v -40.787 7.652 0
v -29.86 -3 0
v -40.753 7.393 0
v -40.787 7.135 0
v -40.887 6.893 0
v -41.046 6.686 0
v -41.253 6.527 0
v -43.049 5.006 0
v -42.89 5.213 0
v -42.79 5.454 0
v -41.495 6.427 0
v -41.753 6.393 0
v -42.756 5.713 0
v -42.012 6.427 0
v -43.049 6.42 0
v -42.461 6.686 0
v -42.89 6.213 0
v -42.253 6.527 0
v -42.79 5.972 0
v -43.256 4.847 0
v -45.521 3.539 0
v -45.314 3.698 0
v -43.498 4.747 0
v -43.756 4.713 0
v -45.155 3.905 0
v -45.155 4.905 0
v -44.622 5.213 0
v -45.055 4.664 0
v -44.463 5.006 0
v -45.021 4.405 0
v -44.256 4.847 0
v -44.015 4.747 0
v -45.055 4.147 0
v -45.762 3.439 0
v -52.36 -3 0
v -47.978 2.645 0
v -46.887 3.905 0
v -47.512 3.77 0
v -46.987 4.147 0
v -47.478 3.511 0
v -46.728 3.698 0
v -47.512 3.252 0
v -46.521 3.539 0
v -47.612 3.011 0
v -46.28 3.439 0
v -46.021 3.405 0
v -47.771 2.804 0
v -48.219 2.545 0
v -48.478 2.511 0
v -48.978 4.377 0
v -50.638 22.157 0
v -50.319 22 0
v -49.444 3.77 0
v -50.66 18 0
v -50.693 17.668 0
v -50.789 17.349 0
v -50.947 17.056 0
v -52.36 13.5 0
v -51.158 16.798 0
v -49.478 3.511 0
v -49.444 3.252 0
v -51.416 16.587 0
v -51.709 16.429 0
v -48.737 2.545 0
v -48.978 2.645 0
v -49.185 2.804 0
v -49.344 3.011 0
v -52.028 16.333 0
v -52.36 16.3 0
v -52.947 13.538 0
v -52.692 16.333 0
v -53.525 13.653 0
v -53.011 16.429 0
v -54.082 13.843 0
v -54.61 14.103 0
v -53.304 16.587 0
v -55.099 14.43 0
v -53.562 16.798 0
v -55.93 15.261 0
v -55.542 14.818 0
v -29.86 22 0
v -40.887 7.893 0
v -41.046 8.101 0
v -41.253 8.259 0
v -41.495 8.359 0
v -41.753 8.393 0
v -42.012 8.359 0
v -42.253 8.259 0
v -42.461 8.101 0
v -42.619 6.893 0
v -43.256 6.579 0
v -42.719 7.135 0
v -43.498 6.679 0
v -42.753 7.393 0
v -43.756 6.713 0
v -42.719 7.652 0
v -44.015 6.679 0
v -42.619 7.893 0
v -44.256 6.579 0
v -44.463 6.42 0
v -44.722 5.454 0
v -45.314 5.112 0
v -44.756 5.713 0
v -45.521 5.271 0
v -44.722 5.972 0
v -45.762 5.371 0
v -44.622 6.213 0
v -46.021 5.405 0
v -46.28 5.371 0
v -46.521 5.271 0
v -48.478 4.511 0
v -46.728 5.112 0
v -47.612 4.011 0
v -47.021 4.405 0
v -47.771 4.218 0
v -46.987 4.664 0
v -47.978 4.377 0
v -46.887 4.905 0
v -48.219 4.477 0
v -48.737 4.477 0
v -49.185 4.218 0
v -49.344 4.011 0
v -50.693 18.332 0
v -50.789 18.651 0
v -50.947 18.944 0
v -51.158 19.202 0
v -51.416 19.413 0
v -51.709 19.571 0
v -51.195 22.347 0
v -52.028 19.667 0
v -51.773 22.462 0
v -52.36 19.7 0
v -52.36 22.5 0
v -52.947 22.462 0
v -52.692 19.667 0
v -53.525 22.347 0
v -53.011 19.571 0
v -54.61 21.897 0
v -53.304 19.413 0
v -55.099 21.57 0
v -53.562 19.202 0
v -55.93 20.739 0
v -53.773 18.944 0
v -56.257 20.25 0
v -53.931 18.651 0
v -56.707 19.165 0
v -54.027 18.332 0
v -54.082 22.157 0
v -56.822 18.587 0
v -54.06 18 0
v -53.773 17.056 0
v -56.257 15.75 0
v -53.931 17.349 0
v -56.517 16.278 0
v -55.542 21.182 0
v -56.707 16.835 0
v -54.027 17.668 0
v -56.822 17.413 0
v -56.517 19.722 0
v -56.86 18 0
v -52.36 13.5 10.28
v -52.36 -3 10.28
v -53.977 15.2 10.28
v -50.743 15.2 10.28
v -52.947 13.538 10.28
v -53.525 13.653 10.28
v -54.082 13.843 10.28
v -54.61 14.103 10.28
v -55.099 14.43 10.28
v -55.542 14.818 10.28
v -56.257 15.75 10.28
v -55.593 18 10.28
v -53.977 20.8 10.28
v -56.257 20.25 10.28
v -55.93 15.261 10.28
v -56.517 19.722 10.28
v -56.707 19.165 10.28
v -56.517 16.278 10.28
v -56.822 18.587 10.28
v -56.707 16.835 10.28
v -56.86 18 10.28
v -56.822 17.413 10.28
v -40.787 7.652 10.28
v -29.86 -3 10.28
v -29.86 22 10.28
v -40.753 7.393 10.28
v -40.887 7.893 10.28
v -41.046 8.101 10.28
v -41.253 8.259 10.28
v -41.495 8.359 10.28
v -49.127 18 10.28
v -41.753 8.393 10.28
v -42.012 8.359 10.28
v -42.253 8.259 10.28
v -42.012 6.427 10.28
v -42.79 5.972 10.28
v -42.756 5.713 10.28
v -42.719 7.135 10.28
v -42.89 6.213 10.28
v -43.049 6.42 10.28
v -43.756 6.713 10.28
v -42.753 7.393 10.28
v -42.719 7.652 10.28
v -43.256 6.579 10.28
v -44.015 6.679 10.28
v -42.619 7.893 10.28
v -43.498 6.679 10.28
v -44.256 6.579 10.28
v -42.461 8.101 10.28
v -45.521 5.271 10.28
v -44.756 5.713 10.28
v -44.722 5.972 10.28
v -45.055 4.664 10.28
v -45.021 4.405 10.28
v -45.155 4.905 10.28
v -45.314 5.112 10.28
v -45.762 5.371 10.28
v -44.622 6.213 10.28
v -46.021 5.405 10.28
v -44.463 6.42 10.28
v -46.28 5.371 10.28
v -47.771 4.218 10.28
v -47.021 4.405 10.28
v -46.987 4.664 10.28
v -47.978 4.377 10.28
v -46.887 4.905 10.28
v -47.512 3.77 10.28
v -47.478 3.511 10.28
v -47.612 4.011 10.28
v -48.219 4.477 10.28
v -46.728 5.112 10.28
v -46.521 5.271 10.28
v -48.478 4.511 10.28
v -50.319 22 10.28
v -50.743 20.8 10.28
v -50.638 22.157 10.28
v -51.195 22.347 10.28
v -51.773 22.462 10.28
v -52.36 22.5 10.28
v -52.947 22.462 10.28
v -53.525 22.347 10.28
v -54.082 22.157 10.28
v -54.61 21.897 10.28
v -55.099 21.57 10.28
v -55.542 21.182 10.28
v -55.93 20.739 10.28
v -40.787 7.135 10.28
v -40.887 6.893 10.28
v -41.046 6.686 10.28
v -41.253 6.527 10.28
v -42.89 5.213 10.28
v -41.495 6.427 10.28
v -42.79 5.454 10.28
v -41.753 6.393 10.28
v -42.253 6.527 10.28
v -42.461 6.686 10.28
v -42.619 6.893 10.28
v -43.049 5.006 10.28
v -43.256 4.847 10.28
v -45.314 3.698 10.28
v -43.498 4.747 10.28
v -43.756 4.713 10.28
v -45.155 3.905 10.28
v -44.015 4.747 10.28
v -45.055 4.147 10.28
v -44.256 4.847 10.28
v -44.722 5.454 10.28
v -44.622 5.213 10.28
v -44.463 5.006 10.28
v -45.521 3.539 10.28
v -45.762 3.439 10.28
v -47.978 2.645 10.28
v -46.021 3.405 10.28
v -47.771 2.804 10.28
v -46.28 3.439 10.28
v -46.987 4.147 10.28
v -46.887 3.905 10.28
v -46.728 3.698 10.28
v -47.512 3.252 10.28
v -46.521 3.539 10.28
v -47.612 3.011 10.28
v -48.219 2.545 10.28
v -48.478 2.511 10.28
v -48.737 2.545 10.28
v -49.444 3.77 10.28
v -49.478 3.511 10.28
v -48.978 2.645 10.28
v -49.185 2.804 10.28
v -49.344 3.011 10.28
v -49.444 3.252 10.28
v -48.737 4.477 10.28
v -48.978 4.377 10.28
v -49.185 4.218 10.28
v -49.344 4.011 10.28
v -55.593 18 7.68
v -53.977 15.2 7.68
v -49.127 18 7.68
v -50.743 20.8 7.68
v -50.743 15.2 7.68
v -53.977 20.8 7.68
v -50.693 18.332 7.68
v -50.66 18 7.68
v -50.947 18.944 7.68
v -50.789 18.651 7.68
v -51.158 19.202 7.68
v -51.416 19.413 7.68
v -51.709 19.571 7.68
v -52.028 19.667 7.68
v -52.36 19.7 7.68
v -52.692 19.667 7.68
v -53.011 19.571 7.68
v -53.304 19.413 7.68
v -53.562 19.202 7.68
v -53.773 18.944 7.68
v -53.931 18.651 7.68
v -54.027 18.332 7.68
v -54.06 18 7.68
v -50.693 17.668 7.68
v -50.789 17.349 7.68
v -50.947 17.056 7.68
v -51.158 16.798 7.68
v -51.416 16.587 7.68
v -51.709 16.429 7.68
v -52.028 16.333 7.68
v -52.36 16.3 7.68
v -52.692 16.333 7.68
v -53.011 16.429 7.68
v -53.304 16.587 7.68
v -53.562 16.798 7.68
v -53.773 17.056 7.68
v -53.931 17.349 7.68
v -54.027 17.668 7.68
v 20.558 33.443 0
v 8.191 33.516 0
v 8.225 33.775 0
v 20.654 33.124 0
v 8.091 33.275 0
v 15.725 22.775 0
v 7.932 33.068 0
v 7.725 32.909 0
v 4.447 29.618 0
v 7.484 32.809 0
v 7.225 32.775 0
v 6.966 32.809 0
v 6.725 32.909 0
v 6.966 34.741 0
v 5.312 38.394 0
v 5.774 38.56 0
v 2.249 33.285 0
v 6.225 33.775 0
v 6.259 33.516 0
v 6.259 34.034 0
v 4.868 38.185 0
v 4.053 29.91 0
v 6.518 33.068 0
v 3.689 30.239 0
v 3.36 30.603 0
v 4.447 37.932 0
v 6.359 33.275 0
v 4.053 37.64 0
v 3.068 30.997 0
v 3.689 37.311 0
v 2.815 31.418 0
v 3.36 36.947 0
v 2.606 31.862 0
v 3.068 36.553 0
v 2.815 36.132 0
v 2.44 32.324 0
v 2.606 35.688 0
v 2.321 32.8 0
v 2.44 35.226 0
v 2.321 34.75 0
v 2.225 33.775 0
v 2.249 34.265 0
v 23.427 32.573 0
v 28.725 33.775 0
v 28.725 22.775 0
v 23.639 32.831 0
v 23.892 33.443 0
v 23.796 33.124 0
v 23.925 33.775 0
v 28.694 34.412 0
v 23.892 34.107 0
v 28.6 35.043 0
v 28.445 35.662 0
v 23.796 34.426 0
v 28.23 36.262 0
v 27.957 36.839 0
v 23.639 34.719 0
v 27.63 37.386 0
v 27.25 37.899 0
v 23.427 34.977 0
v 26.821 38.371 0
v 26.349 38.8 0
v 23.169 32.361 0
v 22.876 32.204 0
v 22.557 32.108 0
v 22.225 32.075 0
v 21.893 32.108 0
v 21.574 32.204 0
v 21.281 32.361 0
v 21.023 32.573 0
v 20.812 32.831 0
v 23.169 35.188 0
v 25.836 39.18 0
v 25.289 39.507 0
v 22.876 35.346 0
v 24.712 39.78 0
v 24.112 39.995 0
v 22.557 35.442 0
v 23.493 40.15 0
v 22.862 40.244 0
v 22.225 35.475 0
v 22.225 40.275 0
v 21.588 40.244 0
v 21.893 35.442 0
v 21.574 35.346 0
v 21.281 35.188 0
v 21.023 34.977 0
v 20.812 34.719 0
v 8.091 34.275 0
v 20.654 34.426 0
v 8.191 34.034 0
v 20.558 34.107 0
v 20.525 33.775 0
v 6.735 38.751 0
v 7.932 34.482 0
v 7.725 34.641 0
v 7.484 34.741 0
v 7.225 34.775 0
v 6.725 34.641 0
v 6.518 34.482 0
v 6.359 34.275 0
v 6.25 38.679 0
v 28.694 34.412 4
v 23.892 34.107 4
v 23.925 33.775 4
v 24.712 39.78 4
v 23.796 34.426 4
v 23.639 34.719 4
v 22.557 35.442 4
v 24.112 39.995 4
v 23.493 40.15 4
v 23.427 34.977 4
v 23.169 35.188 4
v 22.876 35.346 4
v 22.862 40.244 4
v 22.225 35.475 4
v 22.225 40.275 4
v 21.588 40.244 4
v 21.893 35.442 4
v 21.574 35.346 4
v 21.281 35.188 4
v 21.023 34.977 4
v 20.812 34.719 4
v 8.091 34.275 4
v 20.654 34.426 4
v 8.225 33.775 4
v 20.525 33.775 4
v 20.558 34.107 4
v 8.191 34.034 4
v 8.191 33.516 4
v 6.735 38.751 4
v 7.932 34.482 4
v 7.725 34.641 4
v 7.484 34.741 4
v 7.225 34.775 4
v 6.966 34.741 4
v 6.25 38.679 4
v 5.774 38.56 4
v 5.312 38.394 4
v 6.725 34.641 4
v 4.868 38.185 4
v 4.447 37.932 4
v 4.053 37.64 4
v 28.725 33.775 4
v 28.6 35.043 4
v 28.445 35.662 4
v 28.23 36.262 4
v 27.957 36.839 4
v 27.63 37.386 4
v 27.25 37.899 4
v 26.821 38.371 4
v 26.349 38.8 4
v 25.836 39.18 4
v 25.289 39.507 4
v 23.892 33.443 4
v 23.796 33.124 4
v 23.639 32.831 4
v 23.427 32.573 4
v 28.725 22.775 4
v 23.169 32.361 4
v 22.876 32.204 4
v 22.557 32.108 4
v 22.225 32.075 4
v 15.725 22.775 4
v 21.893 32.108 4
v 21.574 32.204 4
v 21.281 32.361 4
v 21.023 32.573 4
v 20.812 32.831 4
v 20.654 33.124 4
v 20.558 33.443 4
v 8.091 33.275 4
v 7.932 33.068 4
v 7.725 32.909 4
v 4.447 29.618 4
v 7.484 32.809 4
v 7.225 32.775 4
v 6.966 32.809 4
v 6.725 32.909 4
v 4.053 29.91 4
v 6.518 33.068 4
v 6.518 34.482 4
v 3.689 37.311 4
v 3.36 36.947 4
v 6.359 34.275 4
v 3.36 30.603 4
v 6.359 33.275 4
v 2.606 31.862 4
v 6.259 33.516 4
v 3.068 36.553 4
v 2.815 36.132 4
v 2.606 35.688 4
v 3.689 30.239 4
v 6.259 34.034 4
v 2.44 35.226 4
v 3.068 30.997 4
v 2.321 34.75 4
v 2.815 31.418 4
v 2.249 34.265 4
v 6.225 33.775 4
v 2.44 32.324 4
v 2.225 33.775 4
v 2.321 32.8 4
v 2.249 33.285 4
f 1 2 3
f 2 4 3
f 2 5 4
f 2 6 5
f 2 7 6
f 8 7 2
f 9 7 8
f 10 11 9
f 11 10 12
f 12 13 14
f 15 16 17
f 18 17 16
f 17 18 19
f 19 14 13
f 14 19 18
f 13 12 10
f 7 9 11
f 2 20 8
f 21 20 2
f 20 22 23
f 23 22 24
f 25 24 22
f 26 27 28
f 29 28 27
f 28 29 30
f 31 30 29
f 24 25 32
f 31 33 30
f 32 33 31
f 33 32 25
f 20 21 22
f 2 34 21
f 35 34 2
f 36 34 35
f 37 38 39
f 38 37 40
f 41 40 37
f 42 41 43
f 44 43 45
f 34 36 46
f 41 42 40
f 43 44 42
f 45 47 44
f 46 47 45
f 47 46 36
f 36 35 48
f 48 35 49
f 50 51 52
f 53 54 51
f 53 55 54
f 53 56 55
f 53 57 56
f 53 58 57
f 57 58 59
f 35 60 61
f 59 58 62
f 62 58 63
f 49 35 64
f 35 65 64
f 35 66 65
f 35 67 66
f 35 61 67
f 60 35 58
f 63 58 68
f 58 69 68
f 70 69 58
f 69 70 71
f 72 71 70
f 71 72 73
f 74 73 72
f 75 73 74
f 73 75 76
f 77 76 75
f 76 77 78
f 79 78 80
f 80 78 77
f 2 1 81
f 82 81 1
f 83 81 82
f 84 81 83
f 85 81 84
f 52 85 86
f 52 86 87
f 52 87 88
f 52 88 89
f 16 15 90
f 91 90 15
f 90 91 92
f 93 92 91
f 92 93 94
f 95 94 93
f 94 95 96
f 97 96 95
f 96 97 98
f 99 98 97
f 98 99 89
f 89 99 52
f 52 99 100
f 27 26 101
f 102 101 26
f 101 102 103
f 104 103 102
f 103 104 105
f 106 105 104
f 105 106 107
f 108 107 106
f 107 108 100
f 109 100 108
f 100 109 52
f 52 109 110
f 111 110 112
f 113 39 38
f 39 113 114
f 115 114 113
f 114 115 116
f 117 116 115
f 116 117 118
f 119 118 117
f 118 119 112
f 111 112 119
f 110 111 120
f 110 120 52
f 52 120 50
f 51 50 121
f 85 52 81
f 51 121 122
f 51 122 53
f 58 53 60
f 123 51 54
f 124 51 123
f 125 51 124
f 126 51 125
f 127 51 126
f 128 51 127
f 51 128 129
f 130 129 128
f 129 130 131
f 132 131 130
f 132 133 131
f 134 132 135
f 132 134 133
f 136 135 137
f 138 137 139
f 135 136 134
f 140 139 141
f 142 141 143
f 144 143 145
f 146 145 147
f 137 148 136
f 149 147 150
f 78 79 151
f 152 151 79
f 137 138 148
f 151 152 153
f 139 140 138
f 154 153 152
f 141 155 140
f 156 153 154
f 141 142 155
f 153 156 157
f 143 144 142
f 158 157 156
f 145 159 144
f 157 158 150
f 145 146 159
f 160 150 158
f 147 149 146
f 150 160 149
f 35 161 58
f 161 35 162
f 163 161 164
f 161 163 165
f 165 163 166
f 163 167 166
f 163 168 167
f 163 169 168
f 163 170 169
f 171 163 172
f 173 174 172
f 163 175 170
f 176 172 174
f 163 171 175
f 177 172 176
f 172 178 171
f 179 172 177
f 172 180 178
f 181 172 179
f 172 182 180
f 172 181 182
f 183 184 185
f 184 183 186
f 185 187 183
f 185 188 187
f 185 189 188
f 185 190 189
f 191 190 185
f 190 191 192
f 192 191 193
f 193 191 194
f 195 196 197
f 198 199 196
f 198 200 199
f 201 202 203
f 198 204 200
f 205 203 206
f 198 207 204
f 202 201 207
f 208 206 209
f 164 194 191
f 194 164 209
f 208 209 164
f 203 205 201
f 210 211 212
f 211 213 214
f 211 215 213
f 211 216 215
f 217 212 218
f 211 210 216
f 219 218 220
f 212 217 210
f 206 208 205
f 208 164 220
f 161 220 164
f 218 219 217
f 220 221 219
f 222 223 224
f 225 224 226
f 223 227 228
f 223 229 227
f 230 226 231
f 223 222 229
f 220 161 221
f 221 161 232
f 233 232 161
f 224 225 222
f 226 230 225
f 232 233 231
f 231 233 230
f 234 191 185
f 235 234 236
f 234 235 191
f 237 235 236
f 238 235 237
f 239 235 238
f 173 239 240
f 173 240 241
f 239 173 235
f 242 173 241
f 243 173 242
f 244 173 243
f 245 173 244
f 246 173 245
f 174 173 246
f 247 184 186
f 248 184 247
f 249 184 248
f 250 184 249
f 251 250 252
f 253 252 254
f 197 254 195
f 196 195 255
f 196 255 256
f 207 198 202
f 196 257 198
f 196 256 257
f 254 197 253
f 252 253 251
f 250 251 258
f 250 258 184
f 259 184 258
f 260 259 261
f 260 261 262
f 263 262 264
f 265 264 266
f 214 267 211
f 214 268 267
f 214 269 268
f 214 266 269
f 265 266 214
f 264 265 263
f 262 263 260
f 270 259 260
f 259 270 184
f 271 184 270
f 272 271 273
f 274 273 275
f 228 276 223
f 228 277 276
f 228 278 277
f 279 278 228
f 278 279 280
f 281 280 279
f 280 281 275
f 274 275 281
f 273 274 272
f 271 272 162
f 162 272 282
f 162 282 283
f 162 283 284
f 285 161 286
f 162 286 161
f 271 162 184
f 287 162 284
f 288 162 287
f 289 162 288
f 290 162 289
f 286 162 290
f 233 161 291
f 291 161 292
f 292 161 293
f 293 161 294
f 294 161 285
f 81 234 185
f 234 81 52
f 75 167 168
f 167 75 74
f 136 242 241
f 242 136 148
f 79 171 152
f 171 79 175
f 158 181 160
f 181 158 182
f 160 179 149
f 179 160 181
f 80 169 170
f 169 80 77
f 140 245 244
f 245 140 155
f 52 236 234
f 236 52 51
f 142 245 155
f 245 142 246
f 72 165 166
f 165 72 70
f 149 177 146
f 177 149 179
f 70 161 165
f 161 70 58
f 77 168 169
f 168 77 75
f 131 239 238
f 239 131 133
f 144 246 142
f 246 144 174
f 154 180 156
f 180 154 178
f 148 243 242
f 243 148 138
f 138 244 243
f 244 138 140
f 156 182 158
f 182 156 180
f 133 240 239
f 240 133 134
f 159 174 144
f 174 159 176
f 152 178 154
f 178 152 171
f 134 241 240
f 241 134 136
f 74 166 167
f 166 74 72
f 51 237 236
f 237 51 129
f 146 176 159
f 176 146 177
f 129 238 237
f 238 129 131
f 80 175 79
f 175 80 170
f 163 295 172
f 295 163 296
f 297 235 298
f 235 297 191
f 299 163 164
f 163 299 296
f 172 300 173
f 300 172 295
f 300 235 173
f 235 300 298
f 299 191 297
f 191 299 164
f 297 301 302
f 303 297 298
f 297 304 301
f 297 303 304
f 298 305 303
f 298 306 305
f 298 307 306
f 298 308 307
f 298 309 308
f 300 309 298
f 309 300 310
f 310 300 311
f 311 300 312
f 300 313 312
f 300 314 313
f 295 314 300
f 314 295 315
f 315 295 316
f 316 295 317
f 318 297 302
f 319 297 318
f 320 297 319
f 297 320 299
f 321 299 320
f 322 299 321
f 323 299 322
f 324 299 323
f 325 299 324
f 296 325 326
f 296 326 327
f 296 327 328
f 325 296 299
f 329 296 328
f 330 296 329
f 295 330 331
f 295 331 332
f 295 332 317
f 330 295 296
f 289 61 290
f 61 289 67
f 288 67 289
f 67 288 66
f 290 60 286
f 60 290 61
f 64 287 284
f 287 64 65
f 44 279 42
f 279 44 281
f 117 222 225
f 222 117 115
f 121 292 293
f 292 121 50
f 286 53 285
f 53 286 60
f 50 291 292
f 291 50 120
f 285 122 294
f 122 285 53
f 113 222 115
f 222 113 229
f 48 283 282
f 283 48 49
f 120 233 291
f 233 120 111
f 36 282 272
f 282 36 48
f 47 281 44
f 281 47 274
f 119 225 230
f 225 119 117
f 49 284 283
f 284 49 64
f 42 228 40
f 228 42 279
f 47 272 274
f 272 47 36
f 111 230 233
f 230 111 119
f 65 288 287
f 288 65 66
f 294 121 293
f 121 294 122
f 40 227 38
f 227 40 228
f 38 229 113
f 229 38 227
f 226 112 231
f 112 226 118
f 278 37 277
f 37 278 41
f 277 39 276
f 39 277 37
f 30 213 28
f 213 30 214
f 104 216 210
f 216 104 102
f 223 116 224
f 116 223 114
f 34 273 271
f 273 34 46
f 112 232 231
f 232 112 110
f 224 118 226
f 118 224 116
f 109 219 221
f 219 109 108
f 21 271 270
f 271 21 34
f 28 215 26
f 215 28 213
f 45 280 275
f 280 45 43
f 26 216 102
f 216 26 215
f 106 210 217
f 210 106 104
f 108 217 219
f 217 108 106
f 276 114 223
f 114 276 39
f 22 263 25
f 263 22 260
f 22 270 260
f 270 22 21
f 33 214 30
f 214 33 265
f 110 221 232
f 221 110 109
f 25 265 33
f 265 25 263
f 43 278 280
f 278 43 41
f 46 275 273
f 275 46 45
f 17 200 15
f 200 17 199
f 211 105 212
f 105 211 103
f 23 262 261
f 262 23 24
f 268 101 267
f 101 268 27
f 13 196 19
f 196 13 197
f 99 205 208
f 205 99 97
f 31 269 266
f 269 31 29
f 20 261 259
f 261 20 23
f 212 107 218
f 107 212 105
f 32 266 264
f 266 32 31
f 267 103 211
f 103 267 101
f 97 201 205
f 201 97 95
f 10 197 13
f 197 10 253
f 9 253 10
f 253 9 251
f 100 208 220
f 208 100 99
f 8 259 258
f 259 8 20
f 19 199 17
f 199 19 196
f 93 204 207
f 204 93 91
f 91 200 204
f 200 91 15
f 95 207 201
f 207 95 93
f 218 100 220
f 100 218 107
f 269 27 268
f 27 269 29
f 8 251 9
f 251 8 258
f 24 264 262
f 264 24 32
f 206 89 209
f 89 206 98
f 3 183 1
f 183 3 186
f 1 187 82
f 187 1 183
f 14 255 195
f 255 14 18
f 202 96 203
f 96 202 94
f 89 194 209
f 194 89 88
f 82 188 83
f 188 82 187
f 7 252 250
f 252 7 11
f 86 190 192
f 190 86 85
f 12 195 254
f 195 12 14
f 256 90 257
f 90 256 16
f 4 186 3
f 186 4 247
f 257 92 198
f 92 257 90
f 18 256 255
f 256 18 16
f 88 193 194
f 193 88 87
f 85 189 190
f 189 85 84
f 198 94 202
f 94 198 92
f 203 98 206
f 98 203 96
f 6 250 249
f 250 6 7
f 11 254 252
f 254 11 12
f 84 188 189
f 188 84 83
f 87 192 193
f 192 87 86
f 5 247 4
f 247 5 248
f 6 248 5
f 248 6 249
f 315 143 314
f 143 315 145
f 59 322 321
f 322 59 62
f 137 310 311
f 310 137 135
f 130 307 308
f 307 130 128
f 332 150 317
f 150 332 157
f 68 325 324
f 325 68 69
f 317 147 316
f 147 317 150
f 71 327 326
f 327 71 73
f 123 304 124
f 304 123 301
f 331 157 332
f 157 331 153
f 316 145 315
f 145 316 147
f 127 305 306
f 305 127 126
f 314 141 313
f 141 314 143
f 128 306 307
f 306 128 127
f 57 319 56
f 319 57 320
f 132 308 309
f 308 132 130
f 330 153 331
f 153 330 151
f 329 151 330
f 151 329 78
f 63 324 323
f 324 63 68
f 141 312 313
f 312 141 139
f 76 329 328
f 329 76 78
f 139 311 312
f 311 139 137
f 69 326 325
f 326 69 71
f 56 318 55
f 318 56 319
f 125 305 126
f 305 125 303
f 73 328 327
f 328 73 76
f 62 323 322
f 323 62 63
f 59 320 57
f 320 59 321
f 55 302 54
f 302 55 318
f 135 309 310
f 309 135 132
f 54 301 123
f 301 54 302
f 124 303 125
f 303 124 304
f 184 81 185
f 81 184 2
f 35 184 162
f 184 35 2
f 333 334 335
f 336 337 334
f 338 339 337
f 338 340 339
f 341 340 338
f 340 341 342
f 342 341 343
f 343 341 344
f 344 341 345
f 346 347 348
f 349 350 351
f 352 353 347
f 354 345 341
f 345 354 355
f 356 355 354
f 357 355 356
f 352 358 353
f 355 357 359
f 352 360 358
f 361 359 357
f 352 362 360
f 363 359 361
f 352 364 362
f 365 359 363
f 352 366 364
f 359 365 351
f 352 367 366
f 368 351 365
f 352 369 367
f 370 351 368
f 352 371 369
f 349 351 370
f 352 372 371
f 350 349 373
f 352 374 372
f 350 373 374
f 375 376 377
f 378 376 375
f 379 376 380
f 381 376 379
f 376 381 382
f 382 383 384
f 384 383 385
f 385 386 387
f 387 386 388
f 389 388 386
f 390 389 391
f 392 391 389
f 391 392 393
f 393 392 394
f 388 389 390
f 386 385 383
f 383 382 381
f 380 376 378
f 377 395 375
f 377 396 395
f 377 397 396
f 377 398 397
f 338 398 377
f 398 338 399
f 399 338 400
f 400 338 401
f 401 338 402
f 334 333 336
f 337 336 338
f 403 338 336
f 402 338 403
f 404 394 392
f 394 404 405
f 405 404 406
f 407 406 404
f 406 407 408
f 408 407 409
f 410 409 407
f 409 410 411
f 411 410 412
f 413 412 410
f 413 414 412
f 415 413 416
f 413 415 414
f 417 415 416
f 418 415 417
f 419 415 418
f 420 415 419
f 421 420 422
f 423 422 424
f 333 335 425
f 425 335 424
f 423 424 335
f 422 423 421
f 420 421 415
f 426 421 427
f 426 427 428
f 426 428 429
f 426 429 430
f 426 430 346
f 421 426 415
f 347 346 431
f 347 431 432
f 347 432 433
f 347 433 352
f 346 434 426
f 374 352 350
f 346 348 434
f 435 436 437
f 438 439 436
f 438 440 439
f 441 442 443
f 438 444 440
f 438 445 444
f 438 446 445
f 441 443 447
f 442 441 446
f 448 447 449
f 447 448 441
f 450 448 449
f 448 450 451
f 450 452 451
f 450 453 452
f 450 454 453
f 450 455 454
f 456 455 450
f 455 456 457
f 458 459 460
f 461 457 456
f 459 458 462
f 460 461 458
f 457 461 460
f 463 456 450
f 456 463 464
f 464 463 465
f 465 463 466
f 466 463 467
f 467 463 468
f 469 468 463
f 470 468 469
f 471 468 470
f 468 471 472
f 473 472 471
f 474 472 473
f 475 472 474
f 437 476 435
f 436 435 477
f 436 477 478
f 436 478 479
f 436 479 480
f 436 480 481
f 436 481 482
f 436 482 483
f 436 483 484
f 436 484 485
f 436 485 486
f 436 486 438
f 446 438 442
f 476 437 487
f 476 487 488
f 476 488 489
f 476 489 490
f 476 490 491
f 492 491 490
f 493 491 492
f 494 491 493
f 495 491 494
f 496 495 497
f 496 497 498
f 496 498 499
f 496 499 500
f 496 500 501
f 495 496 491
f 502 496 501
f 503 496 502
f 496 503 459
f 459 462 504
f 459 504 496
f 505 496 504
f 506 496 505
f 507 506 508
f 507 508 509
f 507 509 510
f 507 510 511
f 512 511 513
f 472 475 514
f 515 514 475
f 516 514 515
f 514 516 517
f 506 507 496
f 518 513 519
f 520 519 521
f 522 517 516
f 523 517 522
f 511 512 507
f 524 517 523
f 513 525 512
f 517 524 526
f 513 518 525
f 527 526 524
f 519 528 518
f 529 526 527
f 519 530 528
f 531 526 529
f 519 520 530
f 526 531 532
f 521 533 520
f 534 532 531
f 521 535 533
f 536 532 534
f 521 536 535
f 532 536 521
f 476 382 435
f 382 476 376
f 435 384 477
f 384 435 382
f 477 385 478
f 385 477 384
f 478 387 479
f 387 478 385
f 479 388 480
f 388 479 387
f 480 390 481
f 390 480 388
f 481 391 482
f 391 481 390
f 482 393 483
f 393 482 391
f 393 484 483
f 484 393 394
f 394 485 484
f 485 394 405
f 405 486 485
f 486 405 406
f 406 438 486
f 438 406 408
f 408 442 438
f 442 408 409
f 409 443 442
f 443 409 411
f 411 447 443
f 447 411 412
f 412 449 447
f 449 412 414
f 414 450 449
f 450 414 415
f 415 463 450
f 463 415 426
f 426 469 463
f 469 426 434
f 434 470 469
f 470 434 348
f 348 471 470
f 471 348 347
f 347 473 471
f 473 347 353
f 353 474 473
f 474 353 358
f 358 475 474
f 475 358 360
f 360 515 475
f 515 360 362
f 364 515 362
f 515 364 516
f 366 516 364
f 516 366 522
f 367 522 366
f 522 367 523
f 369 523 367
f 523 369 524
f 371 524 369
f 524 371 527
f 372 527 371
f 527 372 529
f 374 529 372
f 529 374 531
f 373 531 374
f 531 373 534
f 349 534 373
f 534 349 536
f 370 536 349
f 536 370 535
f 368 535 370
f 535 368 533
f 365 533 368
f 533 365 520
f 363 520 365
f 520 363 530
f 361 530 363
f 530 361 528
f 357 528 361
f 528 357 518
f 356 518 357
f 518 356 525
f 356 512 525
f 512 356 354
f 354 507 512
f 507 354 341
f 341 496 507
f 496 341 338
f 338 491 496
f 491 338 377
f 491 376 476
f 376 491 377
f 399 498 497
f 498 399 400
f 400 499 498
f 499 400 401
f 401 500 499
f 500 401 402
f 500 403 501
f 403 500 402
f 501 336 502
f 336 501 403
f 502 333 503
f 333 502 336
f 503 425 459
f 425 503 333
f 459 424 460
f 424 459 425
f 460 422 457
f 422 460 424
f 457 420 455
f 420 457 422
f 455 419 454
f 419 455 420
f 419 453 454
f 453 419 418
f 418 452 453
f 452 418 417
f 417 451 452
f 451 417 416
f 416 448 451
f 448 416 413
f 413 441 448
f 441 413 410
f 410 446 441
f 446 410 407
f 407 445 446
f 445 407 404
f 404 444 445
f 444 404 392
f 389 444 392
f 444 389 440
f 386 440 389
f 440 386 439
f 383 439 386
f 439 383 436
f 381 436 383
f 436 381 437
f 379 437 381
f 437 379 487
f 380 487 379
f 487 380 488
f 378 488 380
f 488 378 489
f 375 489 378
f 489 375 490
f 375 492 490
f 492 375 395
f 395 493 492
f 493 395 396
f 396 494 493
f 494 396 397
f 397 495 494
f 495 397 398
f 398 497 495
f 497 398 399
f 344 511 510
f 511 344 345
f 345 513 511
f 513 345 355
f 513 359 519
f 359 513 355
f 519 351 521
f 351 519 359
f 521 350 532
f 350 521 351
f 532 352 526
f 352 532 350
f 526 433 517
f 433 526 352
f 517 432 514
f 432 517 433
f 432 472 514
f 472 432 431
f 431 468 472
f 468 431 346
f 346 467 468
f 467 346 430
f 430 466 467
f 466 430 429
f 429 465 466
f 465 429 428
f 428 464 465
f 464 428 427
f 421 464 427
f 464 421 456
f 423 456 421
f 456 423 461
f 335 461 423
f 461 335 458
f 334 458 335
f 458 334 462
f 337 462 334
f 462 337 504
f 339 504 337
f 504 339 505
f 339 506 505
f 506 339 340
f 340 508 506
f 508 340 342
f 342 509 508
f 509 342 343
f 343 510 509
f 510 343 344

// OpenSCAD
// joint_coupon — the pivot joint alone: one leg end and one yoke paddle.
//
// Prints the ONLY untested mechanism in the adjustable mount for a few grams
// instead of 48: does an M3 pivot through the yoke seat in the leg's nut trap,
// and does a 1.75 mm filament stub drop through the yoke's index hole into each
// of the leg's four? Both parts lie flat. Slide them together, screw, pin.
//
// If the pin won't pass or the yoke binds on the leg face, STOP and say which —
// that is a clearance number, not a redesign.
include <../thermal_cam_mount_common.scad>
$fn = 48;

// Leg end: the bottom LEG_STUB mm of one leg, laid on its outer face.
LEG_STUB = 28;
translate([0, 0, 0])
    rotate([0, 90, 0])                        // outer face (x = LEG_XO) down onto z = 0
        translate([-LEG_XO, 0, 0])
            intersection() {
                _arm();
                translate([LEG_XI - 1, PIV_Y - IDX_R - 6, PIV_Z - LEG_END_R - 1])
                    cube([ARM_LEG + 2, IDX_R + 14, LEG_STUB]);
            }

// Yoke paddle: one, laid flat beside it.
translate([45, -PIV_LY, 0])
    linear_extrude(YOKE_T) _yoke_2d();
